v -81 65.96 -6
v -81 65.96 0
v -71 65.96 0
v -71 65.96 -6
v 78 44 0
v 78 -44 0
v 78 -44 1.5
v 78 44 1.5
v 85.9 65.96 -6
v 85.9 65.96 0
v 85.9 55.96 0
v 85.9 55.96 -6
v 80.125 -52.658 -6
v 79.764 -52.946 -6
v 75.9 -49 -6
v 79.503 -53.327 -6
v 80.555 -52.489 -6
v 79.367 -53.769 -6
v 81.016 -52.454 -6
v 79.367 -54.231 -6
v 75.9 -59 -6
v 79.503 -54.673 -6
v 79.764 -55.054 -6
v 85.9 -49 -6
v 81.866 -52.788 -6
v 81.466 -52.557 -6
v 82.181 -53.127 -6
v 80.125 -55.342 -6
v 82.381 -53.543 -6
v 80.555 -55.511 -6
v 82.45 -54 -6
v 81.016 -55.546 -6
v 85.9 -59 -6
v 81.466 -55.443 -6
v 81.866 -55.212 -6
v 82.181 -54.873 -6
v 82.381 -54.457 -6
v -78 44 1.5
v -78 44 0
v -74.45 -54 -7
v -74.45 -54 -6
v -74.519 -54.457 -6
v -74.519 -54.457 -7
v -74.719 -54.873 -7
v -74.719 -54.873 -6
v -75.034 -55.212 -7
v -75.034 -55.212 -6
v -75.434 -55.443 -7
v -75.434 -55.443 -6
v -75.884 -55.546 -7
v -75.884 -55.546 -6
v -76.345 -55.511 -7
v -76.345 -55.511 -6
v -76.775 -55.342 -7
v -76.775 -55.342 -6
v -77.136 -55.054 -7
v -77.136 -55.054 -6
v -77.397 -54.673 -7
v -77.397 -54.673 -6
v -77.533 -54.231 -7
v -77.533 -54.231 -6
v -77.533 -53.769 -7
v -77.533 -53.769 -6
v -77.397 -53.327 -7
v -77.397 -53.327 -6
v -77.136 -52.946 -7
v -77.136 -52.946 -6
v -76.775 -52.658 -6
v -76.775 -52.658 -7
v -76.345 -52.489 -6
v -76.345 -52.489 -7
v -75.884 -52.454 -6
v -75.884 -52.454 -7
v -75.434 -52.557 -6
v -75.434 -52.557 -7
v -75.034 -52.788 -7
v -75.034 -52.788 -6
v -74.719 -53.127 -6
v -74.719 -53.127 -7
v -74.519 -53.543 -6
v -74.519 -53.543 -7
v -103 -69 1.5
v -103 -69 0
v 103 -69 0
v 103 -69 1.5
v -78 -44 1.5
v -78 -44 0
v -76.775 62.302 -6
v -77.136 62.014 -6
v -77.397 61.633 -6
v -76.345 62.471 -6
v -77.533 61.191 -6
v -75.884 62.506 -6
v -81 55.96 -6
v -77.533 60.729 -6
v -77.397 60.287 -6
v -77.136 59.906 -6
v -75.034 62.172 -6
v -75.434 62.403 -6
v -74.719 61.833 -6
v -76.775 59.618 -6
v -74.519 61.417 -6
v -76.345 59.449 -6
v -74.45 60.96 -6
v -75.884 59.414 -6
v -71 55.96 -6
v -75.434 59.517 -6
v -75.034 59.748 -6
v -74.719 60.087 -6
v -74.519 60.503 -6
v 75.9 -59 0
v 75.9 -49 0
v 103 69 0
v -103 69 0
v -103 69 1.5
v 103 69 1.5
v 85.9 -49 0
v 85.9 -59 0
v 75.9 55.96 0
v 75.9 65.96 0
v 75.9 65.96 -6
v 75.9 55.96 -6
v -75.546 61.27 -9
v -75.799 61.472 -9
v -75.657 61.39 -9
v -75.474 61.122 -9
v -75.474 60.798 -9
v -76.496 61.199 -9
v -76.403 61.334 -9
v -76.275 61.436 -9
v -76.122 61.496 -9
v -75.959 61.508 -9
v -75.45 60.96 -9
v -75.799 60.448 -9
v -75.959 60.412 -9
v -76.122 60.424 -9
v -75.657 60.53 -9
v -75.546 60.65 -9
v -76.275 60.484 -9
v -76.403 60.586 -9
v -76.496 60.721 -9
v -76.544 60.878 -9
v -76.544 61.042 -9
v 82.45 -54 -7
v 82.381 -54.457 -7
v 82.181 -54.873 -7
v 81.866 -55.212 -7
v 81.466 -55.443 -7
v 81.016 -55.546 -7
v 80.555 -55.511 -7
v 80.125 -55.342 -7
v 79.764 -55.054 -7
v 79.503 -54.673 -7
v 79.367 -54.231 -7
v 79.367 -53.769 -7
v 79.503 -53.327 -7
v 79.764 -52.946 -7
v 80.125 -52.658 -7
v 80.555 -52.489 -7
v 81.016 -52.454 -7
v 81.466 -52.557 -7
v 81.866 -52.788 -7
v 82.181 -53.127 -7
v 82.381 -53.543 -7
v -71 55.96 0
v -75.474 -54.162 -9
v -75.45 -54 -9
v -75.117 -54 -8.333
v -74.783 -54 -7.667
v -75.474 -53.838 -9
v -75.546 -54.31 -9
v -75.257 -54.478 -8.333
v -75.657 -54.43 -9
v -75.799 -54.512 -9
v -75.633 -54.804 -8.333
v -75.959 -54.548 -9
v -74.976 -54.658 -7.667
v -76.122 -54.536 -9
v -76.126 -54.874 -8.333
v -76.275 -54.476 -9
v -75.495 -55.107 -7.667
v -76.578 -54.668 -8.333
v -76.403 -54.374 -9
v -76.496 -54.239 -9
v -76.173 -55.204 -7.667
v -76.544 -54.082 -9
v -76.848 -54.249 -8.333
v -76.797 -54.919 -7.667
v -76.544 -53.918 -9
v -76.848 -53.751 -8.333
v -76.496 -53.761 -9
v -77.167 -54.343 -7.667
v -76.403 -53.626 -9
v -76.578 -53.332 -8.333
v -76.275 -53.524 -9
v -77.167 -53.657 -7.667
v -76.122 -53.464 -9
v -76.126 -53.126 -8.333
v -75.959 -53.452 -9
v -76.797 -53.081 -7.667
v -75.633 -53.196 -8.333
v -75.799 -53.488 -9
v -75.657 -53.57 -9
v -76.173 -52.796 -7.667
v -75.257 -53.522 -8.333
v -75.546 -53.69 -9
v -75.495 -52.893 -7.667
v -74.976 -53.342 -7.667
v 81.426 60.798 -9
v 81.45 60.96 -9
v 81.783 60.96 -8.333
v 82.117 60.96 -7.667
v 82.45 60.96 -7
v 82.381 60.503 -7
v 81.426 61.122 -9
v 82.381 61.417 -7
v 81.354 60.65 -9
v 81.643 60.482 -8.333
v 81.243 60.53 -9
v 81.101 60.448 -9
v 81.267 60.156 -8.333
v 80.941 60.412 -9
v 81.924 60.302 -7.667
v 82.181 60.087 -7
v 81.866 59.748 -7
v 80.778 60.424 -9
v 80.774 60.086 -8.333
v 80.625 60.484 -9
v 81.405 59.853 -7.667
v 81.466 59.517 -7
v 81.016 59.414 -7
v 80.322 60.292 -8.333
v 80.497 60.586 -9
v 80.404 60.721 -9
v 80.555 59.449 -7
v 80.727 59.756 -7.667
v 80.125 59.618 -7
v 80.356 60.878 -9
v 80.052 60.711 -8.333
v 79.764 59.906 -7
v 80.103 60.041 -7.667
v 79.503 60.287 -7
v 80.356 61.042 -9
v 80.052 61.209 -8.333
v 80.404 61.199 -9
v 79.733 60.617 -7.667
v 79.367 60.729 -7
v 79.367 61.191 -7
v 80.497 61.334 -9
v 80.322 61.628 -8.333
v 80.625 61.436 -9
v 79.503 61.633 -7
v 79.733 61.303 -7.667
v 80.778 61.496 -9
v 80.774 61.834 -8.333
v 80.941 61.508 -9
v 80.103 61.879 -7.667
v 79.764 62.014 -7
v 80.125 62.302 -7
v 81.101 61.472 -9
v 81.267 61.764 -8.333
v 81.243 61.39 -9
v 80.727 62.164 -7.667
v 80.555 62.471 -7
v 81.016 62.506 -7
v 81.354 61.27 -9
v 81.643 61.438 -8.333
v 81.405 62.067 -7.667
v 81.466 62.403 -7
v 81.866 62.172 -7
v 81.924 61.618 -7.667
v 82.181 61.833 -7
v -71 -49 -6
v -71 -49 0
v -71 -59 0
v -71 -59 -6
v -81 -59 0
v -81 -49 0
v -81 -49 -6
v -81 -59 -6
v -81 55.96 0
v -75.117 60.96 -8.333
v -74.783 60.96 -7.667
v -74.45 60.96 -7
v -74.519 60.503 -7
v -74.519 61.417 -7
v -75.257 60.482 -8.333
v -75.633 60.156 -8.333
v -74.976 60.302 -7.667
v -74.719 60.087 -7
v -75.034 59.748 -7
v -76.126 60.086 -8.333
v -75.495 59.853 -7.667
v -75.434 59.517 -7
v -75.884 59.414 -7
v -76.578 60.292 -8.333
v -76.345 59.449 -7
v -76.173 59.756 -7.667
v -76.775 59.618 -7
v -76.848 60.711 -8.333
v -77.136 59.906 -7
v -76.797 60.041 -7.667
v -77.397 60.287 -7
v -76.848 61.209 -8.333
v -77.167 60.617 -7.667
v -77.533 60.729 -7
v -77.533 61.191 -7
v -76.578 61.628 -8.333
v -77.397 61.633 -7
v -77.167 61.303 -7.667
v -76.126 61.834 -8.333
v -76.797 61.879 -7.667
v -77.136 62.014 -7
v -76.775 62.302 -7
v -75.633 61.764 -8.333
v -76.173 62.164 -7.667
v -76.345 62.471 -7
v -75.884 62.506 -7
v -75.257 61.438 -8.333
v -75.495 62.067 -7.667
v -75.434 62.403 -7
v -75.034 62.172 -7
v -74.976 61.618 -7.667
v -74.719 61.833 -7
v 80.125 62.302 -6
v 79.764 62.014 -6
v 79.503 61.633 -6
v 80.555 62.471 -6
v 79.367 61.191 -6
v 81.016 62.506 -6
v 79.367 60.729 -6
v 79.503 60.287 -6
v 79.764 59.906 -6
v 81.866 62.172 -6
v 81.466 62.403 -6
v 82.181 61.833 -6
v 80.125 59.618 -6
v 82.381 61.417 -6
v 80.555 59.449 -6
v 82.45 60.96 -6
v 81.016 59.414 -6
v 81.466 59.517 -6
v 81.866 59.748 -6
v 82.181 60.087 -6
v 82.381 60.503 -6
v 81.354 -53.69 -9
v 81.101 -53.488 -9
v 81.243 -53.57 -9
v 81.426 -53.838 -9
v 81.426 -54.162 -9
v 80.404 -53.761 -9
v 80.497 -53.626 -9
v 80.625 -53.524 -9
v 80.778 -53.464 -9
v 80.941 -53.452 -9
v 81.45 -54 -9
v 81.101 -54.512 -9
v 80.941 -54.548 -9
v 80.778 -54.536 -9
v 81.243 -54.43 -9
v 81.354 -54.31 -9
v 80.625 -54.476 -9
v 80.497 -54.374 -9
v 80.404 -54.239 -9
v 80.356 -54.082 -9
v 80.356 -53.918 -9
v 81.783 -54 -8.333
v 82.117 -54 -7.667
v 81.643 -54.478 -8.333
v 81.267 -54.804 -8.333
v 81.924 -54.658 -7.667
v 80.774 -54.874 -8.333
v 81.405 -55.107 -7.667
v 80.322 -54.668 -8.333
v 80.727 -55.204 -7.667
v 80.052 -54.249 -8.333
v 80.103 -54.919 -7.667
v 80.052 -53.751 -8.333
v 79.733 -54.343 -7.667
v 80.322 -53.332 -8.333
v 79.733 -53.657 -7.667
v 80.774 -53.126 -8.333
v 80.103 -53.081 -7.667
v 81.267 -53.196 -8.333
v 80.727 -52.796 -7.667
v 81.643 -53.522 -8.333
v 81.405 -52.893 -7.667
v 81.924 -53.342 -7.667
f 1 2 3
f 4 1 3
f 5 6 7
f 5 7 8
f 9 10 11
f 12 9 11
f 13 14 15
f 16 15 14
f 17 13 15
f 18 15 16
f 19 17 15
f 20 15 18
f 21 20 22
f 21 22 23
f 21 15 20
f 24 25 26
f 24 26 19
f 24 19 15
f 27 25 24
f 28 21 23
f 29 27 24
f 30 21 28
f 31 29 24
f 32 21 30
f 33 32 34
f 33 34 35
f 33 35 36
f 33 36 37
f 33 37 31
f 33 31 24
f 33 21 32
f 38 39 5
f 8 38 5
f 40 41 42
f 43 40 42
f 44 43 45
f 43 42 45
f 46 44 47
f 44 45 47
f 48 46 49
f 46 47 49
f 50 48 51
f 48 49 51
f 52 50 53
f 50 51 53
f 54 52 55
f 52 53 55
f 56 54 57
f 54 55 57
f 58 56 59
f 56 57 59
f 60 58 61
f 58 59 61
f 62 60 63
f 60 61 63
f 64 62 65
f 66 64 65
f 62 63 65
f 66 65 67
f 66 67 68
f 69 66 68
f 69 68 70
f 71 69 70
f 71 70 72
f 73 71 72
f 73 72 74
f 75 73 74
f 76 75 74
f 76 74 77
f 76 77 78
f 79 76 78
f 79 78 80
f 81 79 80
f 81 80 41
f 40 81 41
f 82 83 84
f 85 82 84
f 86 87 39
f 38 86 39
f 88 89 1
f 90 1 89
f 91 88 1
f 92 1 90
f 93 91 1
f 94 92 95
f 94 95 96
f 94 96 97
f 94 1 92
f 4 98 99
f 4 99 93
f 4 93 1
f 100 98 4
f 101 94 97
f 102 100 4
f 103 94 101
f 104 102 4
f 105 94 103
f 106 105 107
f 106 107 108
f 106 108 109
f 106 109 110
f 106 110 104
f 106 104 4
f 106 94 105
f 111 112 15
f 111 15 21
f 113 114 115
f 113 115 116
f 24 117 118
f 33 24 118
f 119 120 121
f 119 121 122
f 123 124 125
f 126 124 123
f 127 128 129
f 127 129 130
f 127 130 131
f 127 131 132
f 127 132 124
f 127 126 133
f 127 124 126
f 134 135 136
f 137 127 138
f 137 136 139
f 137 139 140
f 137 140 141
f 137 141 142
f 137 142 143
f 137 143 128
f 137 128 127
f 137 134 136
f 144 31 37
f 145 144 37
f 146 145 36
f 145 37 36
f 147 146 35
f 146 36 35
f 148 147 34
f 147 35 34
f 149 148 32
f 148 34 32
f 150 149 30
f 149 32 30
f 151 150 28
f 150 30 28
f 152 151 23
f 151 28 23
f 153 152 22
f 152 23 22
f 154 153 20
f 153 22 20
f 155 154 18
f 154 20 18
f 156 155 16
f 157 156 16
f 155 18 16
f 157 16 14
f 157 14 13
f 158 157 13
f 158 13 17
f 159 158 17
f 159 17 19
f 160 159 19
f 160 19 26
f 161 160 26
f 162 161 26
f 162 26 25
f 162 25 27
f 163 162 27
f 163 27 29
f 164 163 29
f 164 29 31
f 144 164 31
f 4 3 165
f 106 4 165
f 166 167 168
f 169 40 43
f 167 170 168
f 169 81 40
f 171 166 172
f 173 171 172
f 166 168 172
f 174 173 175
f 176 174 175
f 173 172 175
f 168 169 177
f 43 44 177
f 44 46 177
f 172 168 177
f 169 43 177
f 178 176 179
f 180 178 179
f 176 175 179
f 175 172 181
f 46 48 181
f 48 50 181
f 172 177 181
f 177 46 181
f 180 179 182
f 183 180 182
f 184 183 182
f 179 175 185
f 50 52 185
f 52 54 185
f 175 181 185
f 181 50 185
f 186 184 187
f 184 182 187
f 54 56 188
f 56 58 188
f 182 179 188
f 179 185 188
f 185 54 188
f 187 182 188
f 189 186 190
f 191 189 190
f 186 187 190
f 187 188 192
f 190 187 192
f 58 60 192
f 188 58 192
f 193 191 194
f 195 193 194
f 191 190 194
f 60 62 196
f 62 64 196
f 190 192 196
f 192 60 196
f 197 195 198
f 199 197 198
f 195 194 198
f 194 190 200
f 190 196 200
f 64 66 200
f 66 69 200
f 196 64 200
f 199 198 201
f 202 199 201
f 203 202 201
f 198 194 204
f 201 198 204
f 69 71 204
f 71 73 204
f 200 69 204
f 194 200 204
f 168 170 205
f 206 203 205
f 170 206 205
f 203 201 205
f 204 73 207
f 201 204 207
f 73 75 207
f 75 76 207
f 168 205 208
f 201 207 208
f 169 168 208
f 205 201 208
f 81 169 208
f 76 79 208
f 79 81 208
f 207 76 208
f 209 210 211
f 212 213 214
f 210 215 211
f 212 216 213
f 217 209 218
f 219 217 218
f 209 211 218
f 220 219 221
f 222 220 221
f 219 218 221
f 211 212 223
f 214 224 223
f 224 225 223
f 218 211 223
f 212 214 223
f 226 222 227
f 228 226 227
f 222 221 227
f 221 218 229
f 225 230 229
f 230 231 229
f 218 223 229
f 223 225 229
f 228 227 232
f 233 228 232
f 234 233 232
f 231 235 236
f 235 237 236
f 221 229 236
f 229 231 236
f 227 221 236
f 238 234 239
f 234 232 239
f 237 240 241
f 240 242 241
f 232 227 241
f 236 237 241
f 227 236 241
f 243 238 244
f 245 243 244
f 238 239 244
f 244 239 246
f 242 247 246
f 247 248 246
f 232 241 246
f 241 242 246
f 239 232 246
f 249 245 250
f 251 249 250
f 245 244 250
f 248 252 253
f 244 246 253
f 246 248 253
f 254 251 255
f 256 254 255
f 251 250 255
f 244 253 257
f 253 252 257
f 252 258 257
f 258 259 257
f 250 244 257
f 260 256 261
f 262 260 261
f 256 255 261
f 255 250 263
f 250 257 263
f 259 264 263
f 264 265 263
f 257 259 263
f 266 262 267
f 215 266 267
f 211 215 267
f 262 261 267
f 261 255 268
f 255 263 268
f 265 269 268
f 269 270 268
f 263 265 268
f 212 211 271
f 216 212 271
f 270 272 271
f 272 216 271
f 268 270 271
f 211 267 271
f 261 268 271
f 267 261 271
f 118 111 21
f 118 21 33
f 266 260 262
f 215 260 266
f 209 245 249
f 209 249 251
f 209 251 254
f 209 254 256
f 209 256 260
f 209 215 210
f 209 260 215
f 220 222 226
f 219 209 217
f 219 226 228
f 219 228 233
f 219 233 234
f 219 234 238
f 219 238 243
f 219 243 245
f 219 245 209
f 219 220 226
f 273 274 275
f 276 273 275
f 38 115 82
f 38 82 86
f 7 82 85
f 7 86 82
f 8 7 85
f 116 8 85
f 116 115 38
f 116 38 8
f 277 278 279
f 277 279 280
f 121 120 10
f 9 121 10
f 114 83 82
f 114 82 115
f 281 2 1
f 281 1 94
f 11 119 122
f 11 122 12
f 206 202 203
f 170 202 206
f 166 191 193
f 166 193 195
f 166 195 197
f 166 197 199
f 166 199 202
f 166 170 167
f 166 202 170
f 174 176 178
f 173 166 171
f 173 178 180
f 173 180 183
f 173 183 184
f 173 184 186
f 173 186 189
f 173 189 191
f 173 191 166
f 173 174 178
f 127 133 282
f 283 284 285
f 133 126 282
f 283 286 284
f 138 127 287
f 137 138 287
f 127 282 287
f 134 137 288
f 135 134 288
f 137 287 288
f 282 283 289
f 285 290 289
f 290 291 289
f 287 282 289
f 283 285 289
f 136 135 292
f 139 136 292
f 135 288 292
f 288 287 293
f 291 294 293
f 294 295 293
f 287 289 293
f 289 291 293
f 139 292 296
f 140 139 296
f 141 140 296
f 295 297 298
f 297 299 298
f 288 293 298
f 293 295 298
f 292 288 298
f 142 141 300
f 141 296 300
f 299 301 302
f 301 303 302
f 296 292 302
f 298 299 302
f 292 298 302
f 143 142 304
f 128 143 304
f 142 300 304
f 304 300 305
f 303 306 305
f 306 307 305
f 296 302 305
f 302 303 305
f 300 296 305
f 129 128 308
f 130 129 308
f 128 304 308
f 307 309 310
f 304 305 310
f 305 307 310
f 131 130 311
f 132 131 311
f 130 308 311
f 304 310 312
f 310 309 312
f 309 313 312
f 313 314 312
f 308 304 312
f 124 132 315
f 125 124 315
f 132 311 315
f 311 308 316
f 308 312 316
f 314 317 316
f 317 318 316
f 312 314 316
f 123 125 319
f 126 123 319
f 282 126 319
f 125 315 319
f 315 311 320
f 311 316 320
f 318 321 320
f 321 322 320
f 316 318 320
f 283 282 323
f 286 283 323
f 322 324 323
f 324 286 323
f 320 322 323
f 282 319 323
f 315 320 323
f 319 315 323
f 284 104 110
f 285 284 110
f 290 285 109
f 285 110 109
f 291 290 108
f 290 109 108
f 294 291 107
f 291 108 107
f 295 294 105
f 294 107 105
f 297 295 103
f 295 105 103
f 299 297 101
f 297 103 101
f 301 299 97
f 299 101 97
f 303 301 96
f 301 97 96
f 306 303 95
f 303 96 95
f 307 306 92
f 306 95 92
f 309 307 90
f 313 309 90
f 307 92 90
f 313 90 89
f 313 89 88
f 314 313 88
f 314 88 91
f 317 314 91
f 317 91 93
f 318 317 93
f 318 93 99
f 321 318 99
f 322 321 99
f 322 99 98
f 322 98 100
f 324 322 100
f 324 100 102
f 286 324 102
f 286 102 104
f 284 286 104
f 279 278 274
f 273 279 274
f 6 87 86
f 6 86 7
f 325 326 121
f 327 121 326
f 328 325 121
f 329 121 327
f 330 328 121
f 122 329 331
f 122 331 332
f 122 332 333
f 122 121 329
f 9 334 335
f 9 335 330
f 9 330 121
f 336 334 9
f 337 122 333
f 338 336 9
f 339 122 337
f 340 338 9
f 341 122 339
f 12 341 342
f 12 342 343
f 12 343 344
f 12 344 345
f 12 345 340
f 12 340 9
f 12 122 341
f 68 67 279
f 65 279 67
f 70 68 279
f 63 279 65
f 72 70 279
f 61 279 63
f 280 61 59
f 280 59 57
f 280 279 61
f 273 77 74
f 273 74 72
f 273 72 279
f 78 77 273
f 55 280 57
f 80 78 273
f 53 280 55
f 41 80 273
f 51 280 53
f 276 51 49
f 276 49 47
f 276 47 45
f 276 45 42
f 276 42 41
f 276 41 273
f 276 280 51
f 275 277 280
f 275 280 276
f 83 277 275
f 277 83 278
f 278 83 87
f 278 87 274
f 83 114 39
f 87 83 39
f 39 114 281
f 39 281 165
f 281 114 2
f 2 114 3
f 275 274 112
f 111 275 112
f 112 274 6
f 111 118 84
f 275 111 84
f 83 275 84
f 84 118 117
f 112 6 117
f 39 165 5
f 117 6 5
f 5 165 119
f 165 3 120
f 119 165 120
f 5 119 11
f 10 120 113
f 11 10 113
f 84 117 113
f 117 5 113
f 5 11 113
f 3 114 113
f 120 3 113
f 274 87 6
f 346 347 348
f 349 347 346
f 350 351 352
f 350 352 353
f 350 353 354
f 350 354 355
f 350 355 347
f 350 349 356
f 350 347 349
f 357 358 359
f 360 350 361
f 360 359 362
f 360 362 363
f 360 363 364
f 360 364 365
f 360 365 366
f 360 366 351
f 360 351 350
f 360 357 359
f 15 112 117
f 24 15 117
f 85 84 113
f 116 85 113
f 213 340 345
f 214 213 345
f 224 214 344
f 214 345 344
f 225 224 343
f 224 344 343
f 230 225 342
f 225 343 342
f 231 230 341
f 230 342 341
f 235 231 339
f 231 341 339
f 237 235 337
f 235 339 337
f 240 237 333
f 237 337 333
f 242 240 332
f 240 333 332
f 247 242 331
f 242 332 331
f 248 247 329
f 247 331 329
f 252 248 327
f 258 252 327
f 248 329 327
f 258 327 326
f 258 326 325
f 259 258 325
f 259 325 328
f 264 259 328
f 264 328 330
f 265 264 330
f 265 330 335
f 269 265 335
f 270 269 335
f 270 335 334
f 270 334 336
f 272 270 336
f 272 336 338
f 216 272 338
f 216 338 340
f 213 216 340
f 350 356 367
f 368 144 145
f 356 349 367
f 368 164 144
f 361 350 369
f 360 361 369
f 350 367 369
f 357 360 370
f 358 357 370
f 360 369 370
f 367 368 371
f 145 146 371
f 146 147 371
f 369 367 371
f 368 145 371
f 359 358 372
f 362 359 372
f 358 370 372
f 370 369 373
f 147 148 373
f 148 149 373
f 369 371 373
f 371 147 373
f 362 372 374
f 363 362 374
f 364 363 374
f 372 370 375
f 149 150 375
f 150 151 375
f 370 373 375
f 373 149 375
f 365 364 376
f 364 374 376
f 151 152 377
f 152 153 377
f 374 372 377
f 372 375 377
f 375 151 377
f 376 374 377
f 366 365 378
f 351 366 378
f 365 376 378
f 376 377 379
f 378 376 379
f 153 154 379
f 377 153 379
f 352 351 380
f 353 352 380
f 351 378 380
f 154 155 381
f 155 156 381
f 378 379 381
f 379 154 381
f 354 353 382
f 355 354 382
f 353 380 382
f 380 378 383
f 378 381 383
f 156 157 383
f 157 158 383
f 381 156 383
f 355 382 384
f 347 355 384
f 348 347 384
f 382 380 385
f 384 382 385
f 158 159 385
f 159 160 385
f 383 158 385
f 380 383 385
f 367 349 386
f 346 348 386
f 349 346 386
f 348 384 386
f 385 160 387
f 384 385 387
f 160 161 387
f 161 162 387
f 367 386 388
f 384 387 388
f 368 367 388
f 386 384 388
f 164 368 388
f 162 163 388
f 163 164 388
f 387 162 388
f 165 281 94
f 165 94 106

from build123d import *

# Parameters (mm, degrees)
F0_W       = 206
F0_H       = 138
F0_W_2     = 156
F0_H_2     = 88
F1_DEPTH   = 1.5
F2_W       = 10
F2_H       = 10
F2_R       = 1.55
F3_DEPTH   = 6
F4_DEPTH   = 9
F5_SIZE2   = 2
F5_SIZE    = 1
F5_2_SIZE2 = 2
F5_2_SIZE  = 1
F5_3_SIZE2 = 2
F5_3_SIZE  = 1
F5_4_SIZE2 = 2
F5_4_SIZE  = 1


with BuildPart() as f1:
    # F0 (on Top) → F1 (new body)
    with BuildSketch(Plane.XY):
        Rectangle(F0_W, F0_H)
        Rectangle(F0_W_2, F0_H_2, mode=Mode.SUBTRACT)
    extrude(amount=F1_DEPTH)

    # F2 (on face) → F3 (join)
    with BuildSketch(Plane(origin=(0, 0, 0), x_dir=(1, 0, 0), z_dir=(0, 0, -1))):
        with Locations((-76, 54)):
            Rectangle(F2_W, F2_H)
        with Locations((-76, 54)):
            Circle(F2_R, mode=Mode.SUBTRACT)
        with Locations((80.9, 54)):
            Rectangle(F2_W, F2_H)
        with Locations((80.9, 54)):
            Circle(F2_R, mode=Mode.SUBTRACT)
        with Locations((80.9, -60.96)):
            Rectangle(F2_W, F2_H)
        with Locations((80.9, -60.96)):
            Circle(F2_R, mode=Mode.SUBTRACT)
        with Locations((-76, -60.96)):
            Rectangle(F2_W, F2_H)
        with Locations((-76, -60.96)):
            Circle(F2_R, mode=Mode.SUBTRACT)
        with Locations((-76, 54)):
            Circle(F2_R)
        with Locations((-76, -60.96)):
            Circle(F2_R)
        with Locations((80.9, -60.96)):
            Circle(F2_R)
        with Locations((80.9, 54)):
            Circle(F2_R)
    extrude(amount=F3_DEPTH)

    # F2 (on face) → F4 (join)
    with BuildSketch(Plane(origin=(0, 0, 0), x_dir=(1, 0, 0), z_dir=(0, 0, -1))):
        with Locations((-76, 54)):
            Circle(F2_R)
        with Locations((-76, -60.96)):
            Circle(F2_R)
        with Locations((80.9, -60.96)):
            Circle(F2_R)
        with Locations((80.9, 54)):
            Circle(F2_R)
    extrude(amount=F4_DEPTH)

    # F5
    f5_edges = [f1.edges().sort_by_distance(p)[0] for p in [
        (-77.55, -54, -9),
    ]]
    f5_side = f1.faces().sort_by_distance((-76, -54, -9))[0]
    chamfer(f5_edges, length=F5_SIZE, length2=F5_SIZE2, reference=f5_side)

    # F5#2
    f5_2_edges = [f1.edges().sort_by_distance(p)[0] for p in [
        (-77.55, 60.96, -9),
    ]]
    f5_2_side = f1.faces().sort_by_distance((-76, 60.96, -9))[0]
    chamfer(f5_2_edges, length=F5_2_SIZE, length2=F5_2_SIZE2, reference=f5_2_side)

    # F5#3
    f5_3_edges = [f1.edges().sort_by_distance(p)[0] for p in [
        (79.35, -54, -9),
    ]]
    f5_3_side = f1.faces().sort_by_distance((80.9, -54, -9))[0]
    chamfer(f5_3_edges, length=F5_3_SIZE, length2=F5_3_SIZE2, reference=f5_3_side)

    # F5#4
    f5_4_edges = [f1.edges().sort_by_distance(p)[0] for p in [
        (79.35, 60.96, -9),
    ]]
    f5_4_side = f1.faces().sort_by_distance((80.9, 60.96, -9))[0]
    chamfer(f5_4_edges, length=F5_4_SIZE, length2=F5_4_SIZE2, reference=f5_4_side)


solid = f1.part
